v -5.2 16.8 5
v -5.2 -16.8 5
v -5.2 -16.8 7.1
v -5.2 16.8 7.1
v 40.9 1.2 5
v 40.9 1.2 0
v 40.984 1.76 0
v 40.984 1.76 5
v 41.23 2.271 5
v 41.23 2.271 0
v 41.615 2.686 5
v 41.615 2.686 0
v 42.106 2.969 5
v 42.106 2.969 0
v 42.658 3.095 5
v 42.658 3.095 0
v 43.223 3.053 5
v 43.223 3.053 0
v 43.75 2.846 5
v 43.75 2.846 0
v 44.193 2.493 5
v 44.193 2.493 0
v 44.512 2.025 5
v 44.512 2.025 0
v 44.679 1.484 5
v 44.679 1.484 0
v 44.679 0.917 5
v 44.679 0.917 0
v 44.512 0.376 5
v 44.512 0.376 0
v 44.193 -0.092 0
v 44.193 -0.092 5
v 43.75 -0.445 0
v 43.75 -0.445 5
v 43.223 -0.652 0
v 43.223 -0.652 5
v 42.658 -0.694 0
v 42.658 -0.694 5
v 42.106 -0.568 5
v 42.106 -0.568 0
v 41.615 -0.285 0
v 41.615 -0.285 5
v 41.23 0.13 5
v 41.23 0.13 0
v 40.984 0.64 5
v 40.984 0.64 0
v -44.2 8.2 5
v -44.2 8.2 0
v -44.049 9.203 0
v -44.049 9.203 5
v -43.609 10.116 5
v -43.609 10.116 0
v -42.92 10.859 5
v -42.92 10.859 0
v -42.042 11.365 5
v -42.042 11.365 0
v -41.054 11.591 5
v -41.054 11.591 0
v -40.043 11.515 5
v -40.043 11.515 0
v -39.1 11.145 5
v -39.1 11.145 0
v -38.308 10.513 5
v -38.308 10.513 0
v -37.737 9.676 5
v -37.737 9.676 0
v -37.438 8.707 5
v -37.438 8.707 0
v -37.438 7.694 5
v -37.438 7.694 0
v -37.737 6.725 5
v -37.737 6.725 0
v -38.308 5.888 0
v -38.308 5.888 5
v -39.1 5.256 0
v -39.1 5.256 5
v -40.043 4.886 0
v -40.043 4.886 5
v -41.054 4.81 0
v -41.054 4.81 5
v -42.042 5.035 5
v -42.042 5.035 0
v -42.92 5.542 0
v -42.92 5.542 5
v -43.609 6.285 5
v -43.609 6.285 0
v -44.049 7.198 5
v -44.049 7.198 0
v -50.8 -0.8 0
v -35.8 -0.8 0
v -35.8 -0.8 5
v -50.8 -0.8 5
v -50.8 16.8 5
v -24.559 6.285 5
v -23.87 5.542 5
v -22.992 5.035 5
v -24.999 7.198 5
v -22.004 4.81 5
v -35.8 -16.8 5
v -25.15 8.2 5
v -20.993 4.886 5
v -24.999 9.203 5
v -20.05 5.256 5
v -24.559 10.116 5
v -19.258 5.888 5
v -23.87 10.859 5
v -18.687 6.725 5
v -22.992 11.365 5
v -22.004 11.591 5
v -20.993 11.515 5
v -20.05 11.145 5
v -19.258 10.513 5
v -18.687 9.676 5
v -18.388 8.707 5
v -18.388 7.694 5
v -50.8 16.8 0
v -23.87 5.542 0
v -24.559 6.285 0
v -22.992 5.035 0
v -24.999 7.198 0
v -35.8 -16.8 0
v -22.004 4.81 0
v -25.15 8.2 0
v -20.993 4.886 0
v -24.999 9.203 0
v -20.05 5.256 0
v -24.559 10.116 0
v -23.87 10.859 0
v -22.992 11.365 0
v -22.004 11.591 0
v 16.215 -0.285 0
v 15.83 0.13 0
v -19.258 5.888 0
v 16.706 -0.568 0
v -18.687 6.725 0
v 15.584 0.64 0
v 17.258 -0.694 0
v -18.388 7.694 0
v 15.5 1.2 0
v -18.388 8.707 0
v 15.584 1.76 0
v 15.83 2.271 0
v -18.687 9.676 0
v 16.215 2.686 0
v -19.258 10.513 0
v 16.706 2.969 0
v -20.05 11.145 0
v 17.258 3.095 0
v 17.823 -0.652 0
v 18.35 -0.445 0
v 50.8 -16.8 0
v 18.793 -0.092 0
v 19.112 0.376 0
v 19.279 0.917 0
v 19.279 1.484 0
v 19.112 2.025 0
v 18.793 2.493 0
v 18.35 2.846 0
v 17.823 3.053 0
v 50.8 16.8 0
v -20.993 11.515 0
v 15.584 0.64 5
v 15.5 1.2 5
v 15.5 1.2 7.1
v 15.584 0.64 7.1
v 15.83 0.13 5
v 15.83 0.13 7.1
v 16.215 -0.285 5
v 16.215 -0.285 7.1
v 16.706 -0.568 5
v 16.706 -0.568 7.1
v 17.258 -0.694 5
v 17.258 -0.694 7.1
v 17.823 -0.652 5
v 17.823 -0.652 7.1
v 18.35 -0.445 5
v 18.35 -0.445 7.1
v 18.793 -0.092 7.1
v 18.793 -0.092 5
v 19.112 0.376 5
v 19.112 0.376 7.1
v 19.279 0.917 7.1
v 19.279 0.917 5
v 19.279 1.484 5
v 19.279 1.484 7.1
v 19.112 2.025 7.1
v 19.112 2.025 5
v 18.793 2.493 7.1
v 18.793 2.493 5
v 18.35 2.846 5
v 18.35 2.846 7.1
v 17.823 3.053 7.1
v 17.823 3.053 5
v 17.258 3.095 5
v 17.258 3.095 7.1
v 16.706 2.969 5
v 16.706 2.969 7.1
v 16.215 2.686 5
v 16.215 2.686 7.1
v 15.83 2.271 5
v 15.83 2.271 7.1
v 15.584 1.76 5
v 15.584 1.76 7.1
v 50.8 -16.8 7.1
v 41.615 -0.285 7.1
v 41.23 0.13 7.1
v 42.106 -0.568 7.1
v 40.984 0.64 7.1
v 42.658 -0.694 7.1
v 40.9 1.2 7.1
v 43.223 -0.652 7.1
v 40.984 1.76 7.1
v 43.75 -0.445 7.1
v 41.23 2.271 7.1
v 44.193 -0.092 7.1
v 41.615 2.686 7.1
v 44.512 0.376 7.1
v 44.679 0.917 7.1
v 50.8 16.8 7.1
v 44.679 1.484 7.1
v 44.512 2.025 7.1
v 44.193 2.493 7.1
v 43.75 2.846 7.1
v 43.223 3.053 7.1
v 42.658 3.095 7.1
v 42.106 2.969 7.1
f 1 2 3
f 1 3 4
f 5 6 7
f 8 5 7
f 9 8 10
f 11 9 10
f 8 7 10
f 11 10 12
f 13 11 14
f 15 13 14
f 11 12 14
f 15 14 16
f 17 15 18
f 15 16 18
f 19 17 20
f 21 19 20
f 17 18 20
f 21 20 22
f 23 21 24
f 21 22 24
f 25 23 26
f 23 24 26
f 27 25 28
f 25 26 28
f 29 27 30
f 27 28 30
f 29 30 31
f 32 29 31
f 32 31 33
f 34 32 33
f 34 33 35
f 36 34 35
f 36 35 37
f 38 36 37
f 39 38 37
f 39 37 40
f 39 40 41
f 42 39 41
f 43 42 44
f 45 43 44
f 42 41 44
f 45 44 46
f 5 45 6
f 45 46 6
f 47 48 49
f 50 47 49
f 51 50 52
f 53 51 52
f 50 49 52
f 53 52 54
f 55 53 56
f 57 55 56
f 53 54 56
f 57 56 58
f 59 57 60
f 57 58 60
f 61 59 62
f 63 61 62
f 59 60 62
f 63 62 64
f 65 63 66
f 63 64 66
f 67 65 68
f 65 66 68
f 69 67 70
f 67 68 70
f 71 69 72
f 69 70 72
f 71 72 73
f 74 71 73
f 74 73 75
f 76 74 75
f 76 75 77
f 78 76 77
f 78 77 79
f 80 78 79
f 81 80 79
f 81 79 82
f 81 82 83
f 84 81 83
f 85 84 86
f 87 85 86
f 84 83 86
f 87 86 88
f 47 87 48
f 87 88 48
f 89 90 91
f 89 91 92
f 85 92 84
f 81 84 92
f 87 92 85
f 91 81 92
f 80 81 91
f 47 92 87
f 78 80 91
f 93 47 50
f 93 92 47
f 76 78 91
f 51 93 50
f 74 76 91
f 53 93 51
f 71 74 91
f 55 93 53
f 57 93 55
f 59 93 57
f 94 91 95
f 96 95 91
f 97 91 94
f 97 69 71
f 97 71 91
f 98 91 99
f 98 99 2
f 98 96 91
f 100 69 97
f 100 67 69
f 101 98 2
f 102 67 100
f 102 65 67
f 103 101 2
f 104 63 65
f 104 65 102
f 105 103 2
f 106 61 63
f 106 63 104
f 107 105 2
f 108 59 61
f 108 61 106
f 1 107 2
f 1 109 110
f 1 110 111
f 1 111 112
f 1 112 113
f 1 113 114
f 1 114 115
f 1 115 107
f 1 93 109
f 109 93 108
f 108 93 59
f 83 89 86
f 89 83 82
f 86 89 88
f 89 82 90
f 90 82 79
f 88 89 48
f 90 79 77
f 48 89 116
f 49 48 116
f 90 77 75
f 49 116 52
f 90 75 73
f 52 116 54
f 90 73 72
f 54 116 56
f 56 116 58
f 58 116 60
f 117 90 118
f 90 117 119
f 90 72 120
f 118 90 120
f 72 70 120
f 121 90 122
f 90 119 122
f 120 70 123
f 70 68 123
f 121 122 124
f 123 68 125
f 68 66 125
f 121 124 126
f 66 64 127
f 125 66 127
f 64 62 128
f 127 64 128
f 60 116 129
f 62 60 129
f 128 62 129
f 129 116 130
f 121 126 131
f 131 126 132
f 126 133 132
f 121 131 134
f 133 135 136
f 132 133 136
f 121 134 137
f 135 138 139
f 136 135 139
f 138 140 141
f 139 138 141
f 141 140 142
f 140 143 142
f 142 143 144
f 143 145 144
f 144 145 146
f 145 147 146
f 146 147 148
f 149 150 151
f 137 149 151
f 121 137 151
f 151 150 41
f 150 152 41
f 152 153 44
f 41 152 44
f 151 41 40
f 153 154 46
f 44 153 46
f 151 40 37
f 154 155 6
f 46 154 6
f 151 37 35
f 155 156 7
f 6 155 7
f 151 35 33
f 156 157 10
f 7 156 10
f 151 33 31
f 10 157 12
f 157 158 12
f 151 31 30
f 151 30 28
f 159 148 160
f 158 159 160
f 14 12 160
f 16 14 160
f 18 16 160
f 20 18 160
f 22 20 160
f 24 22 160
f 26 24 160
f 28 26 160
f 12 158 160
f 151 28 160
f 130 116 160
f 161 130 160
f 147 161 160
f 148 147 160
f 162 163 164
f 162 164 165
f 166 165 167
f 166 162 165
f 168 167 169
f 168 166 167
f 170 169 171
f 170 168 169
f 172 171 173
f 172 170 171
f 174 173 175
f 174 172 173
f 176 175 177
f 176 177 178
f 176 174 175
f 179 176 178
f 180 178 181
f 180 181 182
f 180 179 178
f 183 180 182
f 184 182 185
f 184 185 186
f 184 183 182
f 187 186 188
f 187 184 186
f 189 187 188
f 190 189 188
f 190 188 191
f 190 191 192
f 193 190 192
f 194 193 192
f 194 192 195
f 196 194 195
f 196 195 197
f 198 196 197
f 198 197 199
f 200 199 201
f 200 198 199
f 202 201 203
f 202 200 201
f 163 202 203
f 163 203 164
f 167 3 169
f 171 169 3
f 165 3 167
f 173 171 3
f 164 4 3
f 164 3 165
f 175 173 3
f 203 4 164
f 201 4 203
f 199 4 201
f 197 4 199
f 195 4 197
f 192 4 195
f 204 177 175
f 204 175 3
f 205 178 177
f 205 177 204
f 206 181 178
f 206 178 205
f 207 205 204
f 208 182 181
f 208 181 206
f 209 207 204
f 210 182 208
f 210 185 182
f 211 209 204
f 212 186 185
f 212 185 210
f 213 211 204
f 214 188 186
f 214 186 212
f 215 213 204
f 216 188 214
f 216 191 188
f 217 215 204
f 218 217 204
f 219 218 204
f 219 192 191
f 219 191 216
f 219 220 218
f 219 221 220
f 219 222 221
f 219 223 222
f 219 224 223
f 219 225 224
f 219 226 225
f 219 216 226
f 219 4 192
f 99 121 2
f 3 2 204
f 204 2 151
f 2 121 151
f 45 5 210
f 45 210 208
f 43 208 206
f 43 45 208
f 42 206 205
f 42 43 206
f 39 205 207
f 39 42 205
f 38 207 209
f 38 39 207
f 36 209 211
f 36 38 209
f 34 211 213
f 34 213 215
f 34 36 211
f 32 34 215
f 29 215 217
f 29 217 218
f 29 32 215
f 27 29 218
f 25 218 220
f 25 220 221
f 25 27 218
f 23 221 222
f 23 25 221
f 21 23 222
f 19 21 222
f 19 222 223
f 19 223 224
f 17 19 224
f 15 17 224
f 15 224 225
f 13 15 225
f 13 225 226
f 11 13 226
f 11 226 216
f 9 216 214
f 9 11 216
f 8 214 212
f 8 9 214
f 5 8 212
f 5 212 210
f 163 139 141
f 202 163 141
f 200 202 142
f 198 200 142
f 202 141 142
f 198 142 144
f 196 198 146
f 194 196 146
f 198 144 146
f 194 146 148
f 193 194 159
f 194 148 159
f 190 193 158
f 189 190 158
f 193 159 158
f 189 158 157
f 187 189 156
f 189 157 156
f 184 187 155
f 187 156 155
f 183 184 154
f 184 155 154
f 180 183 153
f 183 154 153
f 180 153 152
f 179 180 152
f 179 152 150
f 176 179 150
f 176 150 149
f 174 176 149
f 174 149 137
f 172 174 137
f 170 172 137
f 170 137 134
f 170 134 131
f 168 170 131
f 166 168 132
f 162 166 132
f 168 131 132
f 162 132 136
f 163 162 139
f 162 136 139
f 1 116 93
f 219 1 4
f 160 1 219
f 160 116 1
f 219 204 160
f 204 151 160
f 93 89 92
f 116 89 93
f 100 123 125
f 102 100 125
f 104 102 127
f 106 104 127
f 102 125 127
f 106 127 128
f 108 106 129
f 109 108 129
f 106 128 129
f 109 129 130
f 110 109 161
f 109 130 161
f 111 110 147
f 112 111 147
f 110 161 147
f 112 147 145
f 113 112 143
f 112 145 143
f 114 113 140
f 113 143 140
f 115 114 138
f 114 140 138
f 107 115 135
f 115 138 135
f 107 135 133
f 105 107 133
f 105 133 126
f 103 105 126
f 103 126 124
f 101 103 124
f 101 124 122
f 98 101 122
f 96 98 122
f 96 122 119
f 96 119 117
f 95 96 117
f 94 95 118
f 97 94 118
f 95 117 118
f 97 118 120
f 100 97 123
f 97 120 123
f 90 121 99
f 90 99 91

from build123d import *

# Parameters (mm, degrees)
SKETCH1_W           = 101.6
SKETCH1_H           = 33.59912
BOSS_EXTRUDE1_DEPTH = 5
SKETCH2_R           = 3.4
SKETCH2_R_2         = 1.9
CUT_EXTRUDE1_DEPTH  = 5
SKETCH5_W           = 15
SKETCH5_H           = 16
CUT_EXTRUDE4_DEPTH  = 5
SKETCH7_W           = 56
SKETCH7_H           = 33.59912
SKETCH7_R           = 1.9
BOSS_EXTRUDE2_DEPTH = 2.1


with BuildPart() as part:
    # Sketch1 → Boss-Extrude1 (new body)
    with BuildSketch(Plane.XY):
        Rectangle(SKETCH1_W, SKETCH1_H)
    extrude(amount=BOSS_EXTRUDE1_DEPTH)

    # Sketch2 → Cut-Extrude1 (cut)
    with BuildSketch(Plane(origin=(0, 0, 0), x_dir=(-1, 0, 0), z_dir=(0, 0, -1))):
        with Locations((40.8, 8.20044)):
            Circle(SKETCH2_R)
        with Locations((21.75, 8.20044)):
            Circle(SKETCH2_R)
        with Locations((-17.4, 1.20044)):
            Circle(SKETCH2_R_2)
        with Locations((-42.8, 1.20044)):
            Circle(SKETCH2_R_2)
    extrude(amount=-CUT_EXTRUDE1_DEPTH, mode=Mode.SUBTRACT)

    # Sketch5 → Cut-Extrude4 (cut)
    with BuildSketch(Plane(origin=(0, 0, 0), x_dir=(-1, 0, 0), z_dir=(0, 0, -1))):
        with Locations((43.3, -8.79956)):
            Rectangle(SKETCH5_W, SKETCH5_H)
    extrude(amount=-CUT_EXTRUDE4_DEPTH, mode=Mode.SUBTRACT)

    # Sketch7 → Boss-Extrude2 (add)
    with BuildSketch(Plane.XY.offset(5)):
        with Locations((22.8, 0)):
            Rectangle(SKETCH7_W, SKETCH7_H)
        with Locations(Location((17.4, 1.20044, 0), (0, 0, 180))):
            Circle(SKETCH7_R, mode=Mode.SUBTRACT)
        with Locations(Location((42.8, 1.20044, 0), (0, 0, 180))):
            Circle(SKETCH7_R, mode=Mode.SUBTRACT)
    extrude(amount=BOSS_EXTRUDE2_DEPTH)


solid = part.part
